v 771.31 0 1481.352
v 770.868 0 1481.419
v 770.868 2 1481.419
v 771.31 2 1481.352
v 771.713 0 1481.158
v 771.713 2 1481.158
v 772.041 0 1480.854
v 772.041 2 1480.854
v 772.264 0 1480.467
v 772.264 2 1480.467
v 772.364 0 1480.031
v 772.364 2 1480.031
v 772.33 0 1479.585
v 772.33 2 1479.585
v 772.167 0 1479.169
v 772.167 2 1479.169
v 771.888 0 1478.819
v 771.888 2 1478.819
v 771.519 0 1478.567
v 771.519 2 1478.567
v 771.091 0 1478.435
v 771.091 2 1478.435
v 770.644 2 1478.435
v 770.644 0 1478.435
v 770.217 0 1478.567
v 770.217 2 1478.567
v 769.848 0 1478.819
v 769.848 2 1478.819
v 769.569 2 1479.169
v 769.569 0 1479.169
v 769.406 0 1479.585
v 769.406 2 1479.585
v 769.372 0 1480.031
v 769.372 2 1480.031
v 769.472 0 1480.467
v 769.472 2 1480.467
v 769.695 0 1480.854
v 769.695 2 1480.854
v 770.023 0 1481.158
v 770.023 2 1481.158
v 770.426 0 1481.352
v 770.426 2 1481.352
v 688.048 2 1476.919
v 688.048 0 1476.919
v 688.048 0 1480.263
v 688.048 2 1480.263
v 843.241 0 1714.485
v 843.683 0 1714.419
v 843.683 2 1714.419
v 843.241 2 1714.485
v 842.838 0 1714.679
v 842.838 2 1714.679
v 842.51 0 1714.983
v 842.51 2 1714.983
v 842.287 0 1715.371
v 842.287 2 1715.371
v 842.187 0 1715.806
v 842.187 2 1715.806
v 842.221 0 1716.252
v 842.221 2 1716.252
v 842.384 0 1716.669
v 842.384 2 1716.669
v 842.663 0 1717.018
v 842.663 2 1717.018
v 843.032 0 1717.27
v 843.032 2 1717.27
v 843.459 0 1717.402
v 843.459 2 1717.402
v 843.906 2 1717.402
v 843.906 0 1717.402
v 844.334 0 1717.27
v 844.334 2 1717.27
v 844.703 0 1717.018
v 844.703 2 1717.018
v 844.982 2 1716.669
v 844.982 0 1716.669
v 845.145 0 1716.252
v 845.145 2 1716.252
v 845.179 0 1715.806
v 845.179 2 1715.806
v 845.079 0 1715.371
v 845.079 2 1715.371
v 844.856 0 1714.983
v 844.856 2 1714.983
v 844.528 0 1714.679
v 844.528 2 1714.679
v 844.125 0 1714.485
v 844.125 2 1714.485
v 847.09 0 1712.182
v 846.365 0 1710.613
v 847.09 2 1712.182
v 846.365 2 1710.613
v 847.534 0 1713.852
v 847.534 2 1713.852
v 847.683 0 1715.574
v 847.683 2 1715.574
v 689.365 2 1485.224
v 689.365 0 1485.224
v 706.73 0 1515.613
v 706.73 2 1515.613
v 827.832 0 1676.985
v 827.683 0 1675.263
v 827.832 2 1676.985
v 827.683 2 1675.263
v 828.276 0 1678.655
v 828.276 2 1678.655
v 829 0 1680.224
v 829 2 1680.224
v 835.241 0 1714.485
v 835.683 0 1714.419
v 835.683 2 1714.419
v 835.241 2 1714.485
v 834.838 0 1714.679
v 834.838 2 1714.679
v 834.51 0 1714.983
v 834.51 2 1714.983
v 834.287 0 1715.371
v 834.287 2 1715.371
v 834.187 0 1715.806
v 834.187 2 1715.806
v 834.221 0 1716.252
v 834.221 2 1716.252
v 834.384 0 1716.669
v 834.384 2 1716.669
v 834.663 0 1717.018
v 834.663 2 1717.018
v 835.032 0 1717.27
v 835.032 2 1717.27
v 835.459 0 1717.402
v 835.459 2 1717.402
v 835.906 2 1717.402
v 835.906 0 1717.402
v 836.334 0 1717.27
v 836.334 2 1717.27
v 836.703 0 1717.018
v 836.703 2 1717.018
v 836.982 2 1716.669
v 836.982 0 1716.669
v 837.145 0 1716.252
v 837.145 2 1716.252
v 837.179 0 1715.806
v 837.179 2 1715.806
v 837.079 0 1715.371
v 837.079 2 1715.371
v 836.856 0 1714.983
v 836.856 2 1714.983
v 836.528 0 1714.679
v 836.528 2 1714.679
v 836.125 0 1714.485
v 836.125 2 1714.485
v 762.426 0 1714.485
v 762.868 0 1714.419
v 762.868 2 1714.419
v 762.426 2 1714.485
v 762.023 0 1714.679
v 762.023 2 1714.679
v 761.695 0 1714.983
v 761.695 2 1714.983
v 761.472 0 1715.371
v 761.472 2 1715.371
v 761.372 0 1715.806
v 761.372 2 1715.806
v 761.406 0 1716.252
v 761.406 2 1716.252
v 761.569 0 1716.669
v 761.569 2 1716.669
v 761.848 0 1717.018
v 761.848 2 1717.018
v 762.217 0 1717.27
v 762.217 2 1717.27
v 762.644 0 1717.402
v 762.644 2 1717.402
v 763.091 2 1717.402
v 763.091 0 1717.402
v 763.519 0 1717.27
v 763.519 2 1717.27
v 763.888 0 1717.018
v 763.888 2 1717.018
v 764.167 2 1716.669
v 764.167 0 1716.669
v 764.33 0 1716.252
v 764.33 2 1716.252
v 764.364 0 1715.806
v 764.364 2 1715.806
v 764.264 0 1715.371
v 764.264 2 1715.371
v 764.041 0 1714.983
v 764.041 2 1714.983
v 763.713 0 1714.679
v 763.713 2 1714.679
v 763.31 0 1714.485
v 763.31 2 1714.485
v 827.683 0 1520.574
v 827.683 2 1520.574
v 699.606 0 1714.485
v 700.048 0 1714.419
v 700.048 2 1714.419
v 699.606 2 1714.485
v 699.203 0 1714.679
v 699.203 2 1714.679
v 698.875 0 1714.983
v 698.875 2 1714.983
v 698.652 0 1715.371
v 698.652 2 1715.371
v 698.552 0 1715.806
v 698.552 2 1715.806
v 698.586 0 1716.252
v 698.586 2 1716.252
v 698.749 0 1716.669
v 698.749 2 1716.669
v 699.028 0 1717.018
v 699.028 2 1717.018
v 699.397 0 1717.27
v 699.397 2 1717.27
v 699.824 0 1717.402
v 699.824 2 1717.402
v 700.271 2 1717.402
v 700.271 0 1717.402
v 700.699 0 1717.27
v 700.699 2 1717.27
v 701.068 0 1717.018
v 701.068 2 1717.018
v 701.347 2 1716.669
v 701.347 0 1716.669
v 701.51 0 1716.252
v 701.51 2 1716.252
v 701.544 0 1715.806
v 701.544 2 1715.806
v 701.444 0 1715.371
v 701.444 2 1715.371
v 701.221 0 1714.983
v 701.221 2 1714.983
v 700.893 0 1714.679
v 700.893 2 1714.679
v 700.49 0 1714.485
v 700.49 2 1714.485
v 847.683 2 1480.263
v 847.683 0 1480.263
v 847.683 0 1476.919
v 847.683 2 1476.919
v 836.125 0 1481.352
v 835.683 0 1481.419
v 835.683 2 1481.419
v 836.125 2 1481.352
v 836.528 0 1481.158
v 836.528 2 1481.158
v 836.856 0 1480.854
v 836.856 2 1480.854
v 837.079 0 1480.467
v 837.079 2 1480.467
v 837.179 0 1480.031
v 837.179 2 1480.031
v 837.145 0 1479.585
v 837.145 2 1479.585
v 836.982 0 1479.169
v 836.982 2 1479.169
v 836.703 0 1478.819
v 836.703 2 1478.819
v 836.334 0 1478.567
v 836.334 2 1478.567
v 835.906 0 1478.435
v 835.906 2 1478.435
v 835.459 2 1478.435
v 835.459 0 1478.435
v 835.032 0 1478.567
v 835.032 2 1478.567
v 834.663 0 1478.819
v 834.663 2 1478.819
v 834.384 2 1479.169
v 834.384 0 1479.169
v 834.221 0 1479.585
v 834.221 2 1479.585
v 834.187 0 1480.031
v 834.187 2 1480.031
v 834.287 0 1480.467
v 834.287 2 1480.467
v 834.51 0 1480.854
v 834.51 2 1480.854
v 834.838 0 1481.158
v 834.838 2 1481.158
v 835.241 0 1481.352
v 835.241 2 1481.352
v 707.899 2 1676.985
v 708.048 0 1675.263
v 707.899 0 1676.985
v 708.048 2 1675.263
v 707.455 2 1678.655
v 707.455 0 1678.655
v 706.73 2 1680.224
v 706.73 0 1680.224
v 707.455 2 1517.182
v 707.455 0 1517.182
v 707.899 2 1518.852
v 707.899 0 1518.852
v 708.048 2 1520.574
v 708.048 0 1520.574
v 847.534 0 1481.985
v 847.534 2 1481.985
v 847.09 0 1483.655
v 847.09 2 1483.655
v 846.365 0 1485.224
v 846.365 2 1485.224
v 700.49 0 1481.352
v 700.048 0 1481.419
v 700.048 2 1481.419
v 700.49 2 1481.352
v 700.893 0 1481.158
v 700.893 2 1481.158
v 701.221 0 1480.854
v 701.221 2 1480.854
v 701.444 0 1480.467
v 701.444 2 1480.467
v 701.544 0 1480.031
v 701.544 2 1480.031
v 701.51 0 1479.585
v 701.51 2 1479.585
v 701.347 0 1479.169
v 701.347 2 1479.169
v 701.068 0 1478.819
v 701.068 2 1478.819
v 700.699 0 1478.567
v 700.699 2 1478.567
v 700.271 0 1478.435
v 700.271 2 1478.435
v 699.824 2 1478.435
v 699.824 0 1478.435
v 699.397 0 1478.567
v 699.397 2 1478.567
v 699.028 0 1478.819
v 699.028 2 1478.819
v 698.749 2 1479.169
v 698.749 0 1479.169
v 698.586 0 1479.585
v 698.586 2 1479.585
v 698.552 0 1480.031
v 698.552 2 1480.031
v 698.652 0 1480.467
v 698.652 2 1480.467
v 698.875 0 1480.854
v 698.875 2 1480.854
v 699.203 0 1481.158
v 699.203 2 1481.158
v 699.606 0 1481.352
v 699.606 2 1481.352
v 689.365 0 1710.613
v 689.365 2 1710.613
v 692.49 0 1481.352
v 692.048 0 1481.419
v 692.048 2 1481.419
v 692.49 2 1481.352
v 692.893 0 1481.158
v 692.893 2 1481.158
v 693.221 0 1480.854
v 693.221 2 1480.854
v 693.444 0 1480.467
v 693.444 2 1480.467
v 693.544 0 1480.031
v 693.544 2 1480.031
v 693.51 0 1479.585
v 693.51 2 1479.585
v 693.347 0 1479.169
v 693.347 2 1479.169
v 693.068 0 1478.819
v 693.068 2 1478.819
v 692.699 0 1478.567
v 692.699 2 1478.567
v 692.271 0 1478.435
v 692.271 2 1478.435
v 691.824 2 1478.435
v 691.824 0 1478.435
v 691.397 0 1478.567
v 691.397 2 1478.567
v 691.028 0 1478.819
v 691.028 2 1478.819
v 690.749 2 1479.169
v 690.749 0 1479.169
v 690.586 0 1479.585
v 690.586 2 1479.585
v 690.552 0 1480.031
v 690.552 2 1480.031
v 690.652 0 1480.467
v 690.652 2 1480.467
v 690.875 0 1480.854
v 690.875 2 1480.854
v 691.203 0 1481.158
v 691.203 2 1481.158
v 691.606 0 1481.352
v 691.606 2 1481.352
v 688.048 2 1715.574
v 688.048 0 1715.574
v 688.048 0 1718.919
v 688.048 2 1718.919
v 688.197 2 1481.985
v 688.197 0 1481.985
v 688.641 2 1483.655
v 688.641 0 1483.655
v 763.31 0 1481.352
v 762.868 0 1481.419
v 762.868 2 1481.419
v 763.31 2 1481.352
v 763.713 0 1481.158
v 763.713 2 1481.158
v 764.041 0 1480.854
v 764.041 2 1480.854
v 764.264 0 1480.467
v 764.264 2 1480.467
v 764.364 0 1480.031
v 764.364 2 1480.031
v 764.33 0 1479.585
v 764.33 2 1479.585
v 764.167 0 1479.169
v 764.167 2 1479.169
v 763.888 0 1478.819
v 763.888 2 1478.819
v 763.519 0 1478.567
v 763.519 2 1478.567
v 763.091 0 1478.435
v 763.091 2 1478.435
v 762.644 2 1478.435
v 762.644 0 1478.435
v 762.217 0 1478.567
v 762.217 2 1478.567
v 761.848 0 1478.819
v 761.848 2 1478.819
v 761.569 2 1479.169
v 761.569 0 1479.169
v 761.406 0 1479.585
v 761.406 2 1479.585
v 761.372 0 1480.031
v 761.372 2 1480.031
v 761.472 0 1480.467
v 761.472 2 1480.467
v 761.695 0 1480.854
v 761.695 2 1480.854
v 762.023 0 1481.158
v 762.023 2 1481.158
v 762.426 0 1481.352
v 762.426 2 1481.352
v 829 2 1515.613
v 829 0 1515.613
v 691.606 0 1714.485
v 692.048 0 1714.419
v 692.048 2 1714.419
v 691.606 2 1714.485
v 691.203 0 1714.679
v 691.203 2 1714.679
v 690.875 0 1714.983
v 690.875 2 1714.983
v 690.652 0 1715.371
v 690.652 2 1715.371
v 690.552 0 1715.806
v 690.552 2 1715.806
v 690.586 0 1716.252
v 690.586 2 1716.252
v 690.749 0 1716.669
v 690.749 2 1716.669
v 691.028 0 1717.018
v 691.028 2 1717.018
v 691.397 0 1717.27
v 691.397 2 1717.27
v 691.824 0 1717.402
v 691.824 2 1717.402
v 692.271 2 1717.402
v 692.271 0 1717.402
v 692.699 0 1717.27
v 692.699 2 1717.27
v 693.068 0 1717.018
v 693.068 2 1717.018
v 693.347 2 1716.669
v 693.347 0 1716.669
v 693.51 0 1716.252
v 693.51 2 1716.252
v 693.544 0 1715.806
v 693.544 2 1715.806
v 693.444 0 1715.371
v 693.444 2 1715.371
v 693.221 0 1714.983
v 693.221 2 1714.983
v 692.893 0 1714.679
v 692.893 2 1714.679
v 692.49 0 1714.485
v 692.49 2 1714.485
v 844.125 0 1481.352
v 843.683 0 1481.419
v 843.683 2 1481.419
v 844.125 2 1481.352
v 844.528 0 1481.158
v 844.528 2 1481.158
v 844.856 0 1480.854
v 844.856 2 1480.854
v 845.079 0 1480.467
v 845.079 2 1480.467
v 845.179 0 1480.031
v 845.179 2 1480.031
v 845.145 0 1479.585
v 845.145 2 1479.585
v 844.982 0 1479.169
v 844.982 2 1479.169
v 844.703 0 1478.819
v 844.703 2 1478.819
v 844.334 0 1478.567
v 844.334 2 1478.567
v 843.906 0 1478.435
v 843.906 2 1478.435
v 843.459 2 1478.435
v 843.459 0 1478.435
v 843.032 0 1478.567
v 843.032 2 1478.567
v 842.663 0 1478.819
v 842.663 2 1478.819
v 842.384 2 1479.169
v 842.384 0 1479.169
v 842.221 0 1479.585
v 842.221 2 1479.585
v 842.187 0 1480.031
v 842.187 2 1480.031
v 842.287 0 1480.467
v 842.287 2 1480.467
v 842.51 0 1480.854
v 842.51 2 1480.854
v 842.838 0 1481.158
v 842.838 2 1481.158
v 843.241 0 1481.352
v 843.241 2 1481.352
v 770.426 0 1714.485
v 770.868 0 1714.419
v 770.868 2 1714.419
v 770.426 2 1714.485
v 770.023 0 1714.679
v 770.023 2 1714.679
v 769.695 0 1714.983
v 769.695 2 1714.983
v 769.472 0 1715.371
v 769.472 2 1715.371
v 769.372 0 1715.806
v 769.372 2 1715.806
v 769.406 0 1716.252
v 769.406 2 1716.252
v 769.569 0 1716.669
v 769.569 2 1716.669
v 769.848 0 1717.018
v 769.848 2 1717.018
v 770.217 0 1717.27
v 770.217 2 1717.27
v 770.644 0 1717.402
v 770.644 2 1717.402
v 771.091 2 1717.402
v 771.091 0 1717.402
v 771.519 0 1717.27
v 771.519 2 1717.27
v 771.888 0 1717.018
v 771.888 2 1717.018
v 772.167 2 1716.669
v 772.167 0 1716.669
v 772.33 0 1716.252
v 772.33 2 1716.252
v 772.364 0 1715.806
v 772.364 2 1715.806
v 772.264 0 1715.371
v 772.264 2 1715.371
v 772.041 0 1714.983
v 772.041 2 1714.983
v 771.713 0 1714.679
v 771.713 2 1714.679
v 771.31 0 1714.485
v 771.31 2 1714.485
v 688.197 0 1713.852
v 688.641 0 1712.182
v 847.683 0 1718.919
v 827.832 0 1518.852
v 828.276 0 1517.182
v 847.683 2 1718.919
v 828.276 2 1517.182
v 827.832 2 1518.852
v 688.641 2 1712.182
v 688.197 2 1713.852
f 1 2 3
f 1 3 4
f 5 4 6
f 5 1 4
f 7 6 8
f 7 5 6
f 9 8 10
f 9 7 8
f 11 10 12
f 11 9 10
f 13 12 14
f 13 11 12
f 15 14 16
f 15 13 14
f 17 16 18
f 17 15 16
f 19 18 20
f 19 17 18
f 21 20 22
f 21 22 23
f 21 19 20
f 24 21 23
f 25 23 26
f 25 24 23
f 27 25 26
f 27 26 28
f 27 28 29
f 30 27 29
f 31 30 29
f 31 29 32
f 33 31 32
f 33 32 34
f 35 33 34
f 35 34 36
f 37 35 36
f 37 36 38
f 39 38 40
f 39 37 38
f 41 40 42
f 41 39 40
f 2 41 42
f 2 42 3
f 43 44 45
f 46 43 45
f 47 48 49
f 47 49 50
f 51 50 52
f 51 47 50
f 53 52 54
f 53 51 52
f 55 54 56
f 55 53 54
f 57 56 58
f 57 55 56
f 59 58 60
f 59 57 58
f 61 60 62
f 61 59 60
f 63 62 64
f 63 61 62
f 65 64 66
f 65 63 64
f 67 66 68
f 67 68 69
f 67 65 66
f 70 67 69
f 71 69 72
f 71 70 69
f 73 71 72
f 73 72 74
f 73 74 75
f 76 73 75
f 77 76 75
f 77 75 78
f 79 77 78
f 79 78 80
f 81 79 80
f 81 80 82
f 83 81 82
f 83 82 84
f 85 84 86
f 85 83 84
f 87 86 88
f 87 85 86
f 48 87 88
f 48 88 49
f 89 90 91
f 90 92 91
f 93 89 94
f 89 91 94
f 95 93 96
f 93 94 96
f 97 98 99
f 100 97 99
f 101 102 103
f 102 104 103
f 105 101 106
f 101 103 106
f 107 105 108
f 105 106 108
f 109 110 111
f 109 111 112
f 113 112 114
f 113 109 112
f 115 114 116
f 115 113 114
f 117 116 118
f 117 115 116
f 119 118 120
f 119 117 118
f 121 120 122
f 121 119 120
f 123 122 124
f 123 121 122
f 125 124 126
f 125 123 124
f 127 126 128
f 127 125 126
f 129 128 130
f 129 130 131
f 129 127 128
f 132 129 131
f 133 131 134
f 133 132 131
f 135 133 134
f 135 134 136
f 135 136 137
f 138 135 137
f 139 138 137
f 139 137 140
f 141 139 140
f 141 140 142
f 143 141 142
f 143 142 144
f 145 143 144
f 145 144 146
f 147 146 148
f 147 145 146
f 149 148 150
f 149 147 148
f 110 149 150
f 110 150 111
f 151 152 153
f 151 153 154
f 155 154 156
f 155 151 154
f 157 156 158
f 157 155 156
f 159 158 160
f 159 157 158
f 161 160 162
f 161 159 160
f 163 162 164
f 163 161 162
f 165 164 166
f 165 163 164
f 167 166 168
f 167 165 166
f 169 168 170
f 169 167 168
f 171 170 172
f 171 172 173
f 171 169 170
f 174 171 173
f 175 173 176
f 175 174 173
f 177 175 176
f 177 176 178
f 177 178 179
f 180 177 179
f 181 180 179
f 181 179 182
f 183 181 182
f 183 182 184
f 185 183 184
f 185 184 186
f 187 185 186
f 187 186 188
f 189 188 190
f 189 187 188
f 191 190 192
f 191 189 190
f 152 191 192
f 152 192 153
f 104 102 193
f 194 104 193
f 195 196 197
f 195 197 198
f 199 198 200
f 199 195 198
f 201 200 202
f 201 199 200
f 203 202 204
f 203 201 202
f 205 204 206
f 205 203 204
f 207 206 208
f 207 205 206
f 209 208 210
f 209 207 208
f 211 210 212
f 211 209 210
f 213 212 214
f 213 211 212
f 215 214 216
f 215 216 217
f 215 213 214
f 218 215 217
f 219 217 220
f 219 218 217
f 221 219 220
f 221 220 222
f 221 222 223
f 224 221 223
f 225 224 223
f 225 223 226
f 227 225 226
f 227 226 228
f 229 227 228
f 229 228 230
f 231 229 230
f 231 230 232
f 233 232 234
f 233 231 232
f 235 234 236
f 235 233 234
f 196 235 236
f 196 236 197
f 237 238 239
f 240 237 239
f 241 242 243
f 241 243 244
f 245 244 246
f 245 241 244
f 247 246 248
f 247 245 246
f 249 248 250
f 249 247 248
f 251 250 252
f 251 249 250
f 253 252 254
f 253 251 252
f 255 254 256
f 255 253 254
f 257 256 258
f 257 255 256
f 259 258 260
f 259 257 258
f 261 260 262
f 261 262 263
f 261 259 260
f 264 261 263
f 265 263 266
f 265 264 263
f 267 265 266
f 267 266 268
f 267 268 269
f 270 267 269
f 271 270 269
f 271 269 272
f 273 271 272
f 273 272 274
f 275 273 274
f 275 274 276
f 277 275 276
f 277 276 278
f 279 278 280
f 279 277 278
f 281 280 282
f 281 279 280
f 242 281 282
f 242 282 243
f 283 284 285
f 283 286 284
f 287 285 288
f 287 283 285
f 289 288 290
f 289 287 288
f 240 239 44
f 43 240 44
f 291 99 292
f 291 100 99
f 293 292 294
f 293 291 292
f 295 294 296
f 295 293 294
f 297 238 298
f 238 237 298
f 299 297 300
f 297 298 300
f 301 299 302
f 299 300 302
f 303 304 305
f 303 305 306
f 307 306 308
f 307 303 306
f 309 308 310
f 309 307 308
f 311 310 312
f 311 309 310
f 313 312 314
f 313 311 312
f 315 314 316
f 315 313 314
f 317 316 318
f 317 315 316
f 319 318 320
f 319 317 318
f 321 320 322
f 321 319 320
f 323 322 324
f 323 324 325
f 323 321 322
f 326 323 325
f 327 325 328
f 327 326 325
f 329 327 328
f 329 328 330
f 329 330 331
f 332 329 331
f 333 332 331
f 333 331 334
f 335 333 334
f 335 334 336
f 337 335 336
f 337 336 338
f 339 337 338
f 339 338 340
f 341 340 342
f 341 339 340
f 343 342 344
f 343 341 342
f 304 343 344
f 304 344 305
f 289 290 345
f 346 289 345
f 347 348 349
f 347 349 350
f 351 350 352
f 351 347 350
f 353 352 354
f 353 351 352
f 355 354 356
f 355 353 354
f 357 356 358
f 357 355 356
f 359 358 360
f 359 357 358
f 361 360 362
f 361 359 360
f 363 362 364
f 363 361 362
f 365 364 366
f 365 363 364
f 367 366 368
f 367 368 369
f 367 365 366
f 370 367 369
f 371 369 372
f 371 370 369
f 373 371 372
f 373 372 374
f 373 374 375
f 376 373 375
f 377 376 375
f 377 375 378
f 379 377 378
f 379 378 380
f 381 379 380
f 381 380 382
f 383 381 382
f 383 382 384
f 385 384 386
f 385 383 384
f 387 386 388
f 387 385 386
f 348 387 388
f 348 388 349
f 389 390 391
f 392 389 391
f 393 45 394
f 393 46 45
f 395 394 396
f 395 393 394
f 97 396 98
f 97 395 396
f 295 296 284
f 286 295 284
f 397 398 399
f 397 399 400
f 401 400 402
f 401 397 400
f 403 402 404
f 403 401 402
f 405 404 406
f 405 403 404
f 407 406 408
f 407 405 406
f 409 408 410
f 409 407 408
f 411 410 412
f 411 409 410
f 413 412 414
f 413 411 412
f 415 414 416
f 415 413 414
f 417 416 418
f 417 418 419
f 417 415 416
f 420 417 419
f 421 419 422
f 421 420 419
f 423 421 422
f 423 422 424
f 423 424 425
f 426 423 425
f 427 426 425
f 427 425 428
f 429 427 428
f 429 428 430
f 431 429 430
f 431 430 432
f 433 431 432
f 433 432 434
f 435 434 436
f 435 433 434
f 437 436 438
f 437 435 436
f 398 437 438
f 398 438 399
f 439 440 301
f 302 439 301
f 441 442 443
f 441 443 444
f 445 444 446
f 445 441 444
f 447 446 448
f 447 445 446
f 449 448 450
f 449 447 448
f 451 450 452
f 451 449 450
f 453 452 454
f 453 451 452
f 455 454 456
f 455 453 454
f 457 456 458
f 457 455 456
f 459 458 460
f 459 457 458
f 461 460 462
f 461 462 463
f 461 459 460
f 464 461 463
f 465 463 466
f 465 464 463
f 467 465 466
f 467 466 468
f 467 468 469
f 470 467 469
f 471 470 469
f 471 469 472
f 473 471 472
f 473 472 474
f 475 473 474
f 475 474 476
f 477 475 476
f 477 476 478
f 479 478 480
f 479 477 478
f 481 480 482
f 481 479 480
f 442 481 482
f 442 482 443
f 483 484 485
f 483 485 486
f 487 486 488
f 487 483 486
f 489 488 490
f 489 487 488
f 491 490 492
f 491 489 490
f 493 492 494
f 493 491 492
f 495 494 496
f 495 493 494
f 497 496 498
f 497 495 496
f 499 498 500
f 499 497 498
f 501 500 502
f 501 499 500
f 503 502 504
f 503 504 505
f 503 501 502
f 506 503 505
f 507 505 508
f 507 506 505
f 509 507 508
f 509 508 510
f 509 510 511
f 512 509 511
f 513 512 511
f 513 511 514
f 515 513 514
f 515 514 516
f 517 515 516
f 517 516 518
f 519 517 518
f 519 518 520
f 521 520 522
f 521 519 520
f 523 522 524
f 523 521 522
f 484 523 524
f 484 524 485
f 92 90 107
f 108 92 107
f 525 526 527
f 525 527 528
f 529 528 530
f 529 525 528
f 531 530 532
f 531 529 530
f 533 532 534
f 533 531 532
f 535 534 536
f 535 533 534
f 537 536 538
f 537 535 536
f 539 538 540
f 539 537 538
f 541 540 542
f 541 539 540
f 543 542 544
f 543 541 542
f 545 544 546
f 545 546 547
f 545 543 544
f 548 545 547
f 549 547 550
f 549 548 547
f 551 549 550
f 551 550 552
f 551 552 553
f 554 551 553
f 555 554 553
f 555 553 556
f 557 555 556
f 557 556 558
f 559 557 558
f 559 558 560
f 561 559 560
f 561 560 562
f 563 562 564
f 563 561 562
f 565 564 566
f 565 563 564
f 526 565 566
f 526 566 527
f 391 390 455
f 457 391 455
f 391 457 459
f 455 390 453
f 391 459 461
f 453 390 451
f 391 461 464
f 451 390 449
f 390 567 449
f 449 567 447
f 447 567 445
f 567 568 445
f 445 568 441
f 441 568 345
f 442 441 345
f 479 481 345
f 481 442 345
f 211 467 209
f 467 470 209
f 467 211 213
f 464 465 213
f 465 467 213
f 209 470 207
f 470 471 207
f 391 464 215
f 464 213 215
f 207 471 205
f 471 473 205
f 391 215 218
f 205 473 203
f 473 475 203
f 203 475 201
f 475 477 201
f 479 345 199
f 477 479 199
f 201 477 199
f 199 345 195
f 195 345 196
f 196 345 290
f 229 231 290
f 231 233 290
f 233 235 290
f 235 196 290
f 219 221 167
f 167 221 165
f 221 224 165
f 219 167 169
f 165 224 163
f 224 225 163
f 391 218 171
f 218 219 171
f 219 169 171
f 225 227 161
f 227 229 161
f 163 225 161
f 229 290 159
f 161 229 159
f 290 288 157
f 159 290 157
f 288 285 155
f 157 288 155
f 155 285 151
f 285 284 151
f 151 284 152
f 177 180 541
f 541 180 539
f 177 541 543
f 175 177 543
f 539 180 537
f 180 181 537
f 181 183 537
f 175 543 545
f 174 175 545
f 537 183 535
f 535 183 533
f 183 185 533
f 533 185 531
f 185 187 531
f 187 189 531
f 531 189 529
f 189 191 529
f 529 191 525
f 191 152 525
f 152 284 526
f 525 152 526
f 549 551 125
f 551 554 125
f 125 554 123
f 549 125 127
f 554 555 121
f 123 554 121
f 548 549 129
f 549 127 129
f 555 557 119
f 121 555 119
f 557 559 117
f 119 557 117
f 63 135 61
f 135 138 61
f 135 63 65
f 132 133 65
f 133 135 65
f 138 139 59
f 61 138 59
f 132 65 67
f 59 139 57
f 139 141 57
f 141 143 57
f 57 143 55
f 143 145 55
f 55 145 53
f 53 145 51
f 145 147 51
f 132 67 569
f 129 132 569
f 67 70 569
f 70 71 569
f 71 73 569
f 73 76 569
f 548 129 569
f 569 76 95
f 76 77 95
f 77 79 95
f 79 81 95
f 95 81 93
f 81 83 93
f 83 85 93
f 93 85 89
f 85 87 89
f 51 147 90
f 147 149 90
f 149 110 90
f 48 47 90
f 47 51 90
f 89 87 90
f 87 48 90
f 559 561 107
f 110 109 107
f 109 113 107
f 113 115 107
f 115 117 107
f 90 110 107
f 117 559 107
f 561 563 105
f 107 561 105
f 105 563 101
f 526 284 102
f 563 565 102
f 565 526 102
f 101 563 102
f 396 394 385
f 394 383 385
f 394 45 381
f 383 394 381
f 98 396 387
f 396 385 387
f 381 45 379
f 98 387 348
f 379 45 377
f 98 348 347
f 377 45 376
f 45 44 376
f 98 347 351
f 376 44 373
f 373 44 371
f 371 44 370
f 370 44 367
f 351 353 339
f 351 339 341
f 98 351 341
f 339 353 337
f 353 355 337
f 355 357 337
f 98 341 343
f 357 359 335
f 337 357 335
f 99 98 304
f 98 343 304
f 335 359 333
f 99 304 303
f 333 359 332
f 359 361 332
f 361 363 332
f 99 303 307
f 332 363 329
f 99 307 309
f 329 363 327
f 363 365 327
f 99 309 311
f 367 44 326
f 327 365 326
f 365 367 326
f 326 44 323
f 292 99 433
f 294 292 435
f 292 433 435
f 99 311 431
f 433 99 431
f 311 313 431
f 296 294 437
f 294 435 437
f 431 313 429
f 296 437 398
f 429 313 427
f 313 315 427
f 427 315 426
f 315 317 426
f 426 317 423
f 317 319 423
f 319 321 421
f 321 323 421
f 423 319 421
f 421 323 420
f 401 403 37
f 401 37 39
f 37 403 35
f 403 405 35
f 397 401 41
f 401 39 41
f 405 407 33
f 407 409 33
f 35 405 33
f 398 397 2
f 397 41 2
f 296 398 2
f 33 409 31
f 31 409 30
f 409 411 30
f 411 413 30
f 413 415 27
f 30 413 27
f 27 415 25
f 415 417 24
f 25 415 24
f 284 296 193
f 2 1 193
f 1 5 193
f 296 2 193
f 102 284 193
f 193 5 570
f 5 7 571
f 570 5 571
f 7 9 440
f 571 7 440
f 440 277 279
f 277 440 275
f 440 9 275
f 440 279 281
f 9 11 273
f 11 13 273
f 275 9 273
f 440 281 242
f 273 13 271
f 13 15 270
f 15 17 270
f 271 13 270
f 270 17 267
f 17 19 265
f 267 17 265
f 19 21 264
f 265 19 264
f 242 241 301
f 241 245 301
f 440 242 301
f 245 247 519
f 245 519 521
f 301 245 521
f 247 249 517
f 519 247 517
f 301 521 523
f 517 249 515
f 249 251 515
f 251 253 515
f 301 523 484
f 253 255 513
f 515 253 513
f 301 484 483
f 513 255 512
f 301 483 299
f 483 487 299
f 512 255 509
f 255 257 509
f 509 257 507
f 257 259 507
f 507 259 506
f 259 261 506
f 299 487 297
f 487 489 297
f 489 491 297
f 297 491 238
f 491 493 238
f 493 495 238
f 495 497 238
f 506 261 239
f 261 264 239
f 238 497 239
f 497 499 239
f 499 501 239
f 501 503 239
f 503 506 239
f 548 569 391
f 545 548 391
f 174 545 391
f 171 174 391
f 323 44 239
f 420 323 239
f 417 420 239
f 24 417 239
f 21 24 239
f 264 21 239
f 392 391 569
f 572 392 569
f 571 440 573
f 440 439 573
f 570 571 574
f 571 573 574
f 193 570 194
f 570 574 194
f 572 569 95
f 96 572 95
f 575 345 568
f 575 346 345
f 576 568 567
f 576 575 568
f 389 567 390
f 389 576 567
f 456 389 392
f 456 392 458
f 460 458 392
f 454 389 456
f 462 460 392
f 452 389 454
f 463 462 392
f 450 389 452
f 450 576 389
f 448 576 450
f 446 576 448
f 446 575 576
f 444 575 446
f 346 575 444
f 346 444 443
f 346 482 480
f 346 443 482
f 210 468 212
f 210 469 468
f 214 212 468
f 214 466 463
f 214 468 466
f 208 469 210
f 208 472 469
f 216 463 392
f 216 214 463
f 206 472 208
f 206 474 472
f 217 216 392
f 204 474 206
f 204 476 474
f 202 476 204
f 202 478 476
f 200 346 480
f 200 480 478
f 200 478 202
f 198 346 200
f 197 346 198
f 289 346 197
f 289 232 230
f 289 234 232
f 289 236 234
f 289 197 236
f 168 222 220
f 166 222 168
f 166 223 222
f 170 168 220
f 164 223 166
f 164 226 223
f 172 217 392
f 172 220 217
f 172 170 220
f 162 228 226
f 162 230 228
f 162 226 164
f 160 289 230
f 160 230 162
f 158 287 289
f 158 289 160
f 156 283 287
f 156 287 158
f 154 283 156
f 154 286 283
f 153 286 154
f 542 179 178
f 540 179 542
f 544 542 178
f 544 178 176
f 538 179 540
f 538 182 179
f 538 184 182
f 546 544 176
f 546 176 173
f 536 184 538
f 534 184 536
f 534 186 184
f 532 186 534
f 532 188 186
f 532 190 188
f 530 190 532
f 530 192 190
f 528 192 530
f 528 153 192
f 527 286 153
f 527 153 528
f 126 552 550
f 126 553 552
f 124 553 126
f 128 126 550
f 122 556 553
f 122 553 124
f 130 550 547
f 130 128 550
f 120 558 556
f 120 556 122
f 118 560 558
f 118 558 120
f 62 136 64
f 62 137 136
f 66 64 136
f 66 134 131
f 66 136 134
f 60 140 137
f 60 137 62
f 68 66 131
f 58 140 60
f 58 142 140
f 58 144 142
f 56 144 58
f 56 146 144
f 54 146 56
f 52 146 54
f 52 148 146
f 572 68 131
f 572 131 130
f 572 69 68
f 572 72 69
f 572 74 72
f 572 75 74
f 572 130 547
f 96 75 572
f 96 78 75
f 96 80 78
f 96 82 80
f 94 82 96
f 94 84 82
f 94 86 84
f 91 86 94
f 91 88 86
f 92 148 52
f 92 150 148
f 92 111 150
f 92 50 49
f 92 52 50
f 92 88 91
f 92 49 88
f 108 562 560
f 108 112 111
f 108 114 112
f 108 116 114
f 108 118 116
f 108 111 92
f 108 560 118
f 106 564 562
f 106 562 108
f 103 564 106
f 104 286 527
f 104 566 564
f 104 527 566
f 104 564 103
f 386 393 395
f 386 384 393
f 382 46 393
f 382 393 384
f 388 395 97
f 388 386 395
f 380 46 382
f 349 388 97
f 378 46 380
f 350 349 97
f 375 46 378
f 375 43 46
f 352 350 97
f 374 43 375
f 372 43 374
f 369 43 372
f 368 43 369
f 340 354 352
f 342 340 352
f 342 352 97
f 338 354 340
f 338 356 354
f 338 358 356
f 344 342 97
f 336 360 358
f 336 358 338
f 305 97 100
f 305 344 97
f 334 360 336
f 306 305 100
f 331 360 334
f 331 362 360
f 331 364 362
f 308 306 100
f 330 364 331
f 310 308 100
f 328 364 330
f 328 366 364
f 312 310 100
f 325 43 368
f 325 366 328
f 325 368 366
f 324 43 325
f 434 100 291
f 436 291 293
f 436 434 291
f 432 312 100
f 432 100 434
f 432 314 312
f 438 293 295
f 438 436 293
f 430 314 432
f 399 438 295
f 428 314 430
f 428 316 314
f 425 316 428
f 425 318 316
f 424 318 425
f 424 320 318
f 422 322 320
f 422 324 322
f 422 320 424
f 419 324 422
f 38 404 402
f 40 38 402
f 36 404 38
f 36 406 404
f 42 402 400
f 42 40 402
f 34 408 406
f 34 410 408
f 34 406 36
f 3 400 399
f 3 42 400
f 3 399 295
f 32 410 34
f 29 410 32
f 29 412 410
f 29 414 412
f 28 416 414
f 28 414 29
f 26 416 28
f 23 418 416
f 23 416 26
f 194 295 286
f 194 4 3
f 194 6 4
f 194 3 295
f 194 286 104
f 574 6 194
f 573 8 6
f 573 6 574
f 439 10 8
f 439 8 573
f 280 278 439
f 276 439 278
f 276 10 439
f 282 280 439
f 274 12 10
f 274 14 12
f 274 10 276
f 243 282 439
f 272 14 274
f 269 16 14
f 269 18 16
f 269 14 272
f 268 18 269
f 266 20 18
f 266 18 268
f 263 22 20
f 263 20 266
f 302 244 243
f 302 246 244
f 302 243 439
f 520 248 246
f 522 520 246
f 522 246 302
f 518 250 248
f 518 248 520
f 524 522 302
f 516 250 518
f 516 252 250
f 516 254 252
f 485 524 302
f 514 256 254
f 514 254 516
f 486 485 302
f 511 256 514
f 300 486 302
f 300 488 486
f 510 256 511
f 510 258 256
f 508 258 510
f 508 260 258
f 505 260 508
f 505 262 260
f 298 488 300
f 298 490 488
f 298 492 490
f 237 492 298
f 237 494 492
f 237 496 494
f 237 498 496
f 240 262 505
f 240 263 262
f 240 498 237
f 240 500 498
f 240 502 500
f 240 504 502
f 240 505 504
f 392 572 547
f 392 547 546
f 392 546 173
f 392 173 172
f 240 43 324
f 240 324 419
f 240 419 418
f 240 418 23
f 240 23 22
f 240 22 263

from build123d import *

# Parameters (mm, degrees)
SKETCH2_R           = 1.5
BOSS_EXTRUDE1_DEPTH = 2
FILLET1_R           = 10


with BuildPart() as part:
    # Sketch2 → Boss-Extrude1 (new body)
    with BuildSketch(Plane(origin=(0, 0, 0), x_dir=(1, 0, 0), z_dir=(0, 1, 0))):
        Polygon((688.047893911, -1476.918579287), (688.047893911, -1482.918579287), (708.047893911, -1517.918579287), (708.047893911, -1677.918579287), (688.047893911, -1712.918579287), (688.047893911, -1718.918579287), (847.682893911, -1718.918579287), (847.682893911, -1712.918579287), (827.682893911, -1677.918579287), (827.682893911, -1517.918579287), (847.682893911, -1482.918579287), (847.682893911, -1476.918579287), align=None)
        with Locations(Location((843.682893911, -1479.918579287, 0), (0, 0, 270))):
            Circle(SKETCH2_R, mode=Mode.SUBTRACT)
        with Locations(Location((835.682893911, -1479.918579287, 0), (0, 0, 270))):
            Circle(SKETCH2_R, mode=Mode.SUBTRACT)
        with Locations(Location((762.867893911, -1479.918579287, 0), (0, 0, 270))):
            Circle(SKETCH2_R, mode=Mode.SUBTRACT)
        with Locations(Location((770.867893911, -1479.918579287, 0), (0, 0, 270))):
            Circle(SKETCH2_R, mode=Mode.SUBTRACT)
        with Locations(Location((700.047893911, -1479.918579287, 0), (0, 0, 270))):
            Circle(SKETCH2_R, mode=Mode.SUBTRACT)
        with Locations(Location((692.047893911, -1479.918579287, 0), (0, 0, 270))):
            Circle(SKETCH2_R, mode=Mode.SUBTRACT)
        with Locations(Location((692.047893911, -1715.918579287, 0), (0, 0, 90))):
            Circle(SKETCH2_R, mode=Mode.SUBTRACT)
        with Locations(Location((700.047893911, -1715.918579287, 0), (0, 0, 90))):
            Circle(SKETCH2_R, mode=Mode.SUBTRACT)
        with Locations(Location((770.867893911, -1715.918579287, 0), (0, 0, 90))):
            Circle(SKETCH2_R, mode=Mode.SUBTRACT)
        with Locations(Location((762.867893911, -1715.918579287, 0), (0, 0, 90))):
            Circle(SKETCH2_R, mode=Mode.SUBTRACT)
        with Locations(Location((835.682893911, -1715.918579287, 0), (0, 0, 90))):
            Circle(SKETCH2_R, mode=Mode.SUBTRACT)
        with Locations(Location((843.682893911, -1715.918579287, 0), (0, 0, 90))):
            Circle(SKETCH2_R, mode=Mode.SUBTRACT)
    extrude(amount=BOSS_EXTRUDE1_DEPTH)

    # Fillet1
    fillet1_edges = [part.edges().sort_by_distance(p)[0] for p in [
        (847.682893911, 1, 1712.918579287),
        (688.047893911, 1, 1712.918579287),
        (708.047893911, 1, 1677.918579287),
        (708.047893911, 1, 1517.918579287),
        (688.047893911, 1, 1482.918579287),
        (847.682893911, 1, 1482.918579287),
        (827.682893911, 1, 1517.918579287),
        (827.682893911, 1, 1677.918579287),
    ]]
    fillet(fillet1_edges, radius=FILLET1_R)


solid = part.part
